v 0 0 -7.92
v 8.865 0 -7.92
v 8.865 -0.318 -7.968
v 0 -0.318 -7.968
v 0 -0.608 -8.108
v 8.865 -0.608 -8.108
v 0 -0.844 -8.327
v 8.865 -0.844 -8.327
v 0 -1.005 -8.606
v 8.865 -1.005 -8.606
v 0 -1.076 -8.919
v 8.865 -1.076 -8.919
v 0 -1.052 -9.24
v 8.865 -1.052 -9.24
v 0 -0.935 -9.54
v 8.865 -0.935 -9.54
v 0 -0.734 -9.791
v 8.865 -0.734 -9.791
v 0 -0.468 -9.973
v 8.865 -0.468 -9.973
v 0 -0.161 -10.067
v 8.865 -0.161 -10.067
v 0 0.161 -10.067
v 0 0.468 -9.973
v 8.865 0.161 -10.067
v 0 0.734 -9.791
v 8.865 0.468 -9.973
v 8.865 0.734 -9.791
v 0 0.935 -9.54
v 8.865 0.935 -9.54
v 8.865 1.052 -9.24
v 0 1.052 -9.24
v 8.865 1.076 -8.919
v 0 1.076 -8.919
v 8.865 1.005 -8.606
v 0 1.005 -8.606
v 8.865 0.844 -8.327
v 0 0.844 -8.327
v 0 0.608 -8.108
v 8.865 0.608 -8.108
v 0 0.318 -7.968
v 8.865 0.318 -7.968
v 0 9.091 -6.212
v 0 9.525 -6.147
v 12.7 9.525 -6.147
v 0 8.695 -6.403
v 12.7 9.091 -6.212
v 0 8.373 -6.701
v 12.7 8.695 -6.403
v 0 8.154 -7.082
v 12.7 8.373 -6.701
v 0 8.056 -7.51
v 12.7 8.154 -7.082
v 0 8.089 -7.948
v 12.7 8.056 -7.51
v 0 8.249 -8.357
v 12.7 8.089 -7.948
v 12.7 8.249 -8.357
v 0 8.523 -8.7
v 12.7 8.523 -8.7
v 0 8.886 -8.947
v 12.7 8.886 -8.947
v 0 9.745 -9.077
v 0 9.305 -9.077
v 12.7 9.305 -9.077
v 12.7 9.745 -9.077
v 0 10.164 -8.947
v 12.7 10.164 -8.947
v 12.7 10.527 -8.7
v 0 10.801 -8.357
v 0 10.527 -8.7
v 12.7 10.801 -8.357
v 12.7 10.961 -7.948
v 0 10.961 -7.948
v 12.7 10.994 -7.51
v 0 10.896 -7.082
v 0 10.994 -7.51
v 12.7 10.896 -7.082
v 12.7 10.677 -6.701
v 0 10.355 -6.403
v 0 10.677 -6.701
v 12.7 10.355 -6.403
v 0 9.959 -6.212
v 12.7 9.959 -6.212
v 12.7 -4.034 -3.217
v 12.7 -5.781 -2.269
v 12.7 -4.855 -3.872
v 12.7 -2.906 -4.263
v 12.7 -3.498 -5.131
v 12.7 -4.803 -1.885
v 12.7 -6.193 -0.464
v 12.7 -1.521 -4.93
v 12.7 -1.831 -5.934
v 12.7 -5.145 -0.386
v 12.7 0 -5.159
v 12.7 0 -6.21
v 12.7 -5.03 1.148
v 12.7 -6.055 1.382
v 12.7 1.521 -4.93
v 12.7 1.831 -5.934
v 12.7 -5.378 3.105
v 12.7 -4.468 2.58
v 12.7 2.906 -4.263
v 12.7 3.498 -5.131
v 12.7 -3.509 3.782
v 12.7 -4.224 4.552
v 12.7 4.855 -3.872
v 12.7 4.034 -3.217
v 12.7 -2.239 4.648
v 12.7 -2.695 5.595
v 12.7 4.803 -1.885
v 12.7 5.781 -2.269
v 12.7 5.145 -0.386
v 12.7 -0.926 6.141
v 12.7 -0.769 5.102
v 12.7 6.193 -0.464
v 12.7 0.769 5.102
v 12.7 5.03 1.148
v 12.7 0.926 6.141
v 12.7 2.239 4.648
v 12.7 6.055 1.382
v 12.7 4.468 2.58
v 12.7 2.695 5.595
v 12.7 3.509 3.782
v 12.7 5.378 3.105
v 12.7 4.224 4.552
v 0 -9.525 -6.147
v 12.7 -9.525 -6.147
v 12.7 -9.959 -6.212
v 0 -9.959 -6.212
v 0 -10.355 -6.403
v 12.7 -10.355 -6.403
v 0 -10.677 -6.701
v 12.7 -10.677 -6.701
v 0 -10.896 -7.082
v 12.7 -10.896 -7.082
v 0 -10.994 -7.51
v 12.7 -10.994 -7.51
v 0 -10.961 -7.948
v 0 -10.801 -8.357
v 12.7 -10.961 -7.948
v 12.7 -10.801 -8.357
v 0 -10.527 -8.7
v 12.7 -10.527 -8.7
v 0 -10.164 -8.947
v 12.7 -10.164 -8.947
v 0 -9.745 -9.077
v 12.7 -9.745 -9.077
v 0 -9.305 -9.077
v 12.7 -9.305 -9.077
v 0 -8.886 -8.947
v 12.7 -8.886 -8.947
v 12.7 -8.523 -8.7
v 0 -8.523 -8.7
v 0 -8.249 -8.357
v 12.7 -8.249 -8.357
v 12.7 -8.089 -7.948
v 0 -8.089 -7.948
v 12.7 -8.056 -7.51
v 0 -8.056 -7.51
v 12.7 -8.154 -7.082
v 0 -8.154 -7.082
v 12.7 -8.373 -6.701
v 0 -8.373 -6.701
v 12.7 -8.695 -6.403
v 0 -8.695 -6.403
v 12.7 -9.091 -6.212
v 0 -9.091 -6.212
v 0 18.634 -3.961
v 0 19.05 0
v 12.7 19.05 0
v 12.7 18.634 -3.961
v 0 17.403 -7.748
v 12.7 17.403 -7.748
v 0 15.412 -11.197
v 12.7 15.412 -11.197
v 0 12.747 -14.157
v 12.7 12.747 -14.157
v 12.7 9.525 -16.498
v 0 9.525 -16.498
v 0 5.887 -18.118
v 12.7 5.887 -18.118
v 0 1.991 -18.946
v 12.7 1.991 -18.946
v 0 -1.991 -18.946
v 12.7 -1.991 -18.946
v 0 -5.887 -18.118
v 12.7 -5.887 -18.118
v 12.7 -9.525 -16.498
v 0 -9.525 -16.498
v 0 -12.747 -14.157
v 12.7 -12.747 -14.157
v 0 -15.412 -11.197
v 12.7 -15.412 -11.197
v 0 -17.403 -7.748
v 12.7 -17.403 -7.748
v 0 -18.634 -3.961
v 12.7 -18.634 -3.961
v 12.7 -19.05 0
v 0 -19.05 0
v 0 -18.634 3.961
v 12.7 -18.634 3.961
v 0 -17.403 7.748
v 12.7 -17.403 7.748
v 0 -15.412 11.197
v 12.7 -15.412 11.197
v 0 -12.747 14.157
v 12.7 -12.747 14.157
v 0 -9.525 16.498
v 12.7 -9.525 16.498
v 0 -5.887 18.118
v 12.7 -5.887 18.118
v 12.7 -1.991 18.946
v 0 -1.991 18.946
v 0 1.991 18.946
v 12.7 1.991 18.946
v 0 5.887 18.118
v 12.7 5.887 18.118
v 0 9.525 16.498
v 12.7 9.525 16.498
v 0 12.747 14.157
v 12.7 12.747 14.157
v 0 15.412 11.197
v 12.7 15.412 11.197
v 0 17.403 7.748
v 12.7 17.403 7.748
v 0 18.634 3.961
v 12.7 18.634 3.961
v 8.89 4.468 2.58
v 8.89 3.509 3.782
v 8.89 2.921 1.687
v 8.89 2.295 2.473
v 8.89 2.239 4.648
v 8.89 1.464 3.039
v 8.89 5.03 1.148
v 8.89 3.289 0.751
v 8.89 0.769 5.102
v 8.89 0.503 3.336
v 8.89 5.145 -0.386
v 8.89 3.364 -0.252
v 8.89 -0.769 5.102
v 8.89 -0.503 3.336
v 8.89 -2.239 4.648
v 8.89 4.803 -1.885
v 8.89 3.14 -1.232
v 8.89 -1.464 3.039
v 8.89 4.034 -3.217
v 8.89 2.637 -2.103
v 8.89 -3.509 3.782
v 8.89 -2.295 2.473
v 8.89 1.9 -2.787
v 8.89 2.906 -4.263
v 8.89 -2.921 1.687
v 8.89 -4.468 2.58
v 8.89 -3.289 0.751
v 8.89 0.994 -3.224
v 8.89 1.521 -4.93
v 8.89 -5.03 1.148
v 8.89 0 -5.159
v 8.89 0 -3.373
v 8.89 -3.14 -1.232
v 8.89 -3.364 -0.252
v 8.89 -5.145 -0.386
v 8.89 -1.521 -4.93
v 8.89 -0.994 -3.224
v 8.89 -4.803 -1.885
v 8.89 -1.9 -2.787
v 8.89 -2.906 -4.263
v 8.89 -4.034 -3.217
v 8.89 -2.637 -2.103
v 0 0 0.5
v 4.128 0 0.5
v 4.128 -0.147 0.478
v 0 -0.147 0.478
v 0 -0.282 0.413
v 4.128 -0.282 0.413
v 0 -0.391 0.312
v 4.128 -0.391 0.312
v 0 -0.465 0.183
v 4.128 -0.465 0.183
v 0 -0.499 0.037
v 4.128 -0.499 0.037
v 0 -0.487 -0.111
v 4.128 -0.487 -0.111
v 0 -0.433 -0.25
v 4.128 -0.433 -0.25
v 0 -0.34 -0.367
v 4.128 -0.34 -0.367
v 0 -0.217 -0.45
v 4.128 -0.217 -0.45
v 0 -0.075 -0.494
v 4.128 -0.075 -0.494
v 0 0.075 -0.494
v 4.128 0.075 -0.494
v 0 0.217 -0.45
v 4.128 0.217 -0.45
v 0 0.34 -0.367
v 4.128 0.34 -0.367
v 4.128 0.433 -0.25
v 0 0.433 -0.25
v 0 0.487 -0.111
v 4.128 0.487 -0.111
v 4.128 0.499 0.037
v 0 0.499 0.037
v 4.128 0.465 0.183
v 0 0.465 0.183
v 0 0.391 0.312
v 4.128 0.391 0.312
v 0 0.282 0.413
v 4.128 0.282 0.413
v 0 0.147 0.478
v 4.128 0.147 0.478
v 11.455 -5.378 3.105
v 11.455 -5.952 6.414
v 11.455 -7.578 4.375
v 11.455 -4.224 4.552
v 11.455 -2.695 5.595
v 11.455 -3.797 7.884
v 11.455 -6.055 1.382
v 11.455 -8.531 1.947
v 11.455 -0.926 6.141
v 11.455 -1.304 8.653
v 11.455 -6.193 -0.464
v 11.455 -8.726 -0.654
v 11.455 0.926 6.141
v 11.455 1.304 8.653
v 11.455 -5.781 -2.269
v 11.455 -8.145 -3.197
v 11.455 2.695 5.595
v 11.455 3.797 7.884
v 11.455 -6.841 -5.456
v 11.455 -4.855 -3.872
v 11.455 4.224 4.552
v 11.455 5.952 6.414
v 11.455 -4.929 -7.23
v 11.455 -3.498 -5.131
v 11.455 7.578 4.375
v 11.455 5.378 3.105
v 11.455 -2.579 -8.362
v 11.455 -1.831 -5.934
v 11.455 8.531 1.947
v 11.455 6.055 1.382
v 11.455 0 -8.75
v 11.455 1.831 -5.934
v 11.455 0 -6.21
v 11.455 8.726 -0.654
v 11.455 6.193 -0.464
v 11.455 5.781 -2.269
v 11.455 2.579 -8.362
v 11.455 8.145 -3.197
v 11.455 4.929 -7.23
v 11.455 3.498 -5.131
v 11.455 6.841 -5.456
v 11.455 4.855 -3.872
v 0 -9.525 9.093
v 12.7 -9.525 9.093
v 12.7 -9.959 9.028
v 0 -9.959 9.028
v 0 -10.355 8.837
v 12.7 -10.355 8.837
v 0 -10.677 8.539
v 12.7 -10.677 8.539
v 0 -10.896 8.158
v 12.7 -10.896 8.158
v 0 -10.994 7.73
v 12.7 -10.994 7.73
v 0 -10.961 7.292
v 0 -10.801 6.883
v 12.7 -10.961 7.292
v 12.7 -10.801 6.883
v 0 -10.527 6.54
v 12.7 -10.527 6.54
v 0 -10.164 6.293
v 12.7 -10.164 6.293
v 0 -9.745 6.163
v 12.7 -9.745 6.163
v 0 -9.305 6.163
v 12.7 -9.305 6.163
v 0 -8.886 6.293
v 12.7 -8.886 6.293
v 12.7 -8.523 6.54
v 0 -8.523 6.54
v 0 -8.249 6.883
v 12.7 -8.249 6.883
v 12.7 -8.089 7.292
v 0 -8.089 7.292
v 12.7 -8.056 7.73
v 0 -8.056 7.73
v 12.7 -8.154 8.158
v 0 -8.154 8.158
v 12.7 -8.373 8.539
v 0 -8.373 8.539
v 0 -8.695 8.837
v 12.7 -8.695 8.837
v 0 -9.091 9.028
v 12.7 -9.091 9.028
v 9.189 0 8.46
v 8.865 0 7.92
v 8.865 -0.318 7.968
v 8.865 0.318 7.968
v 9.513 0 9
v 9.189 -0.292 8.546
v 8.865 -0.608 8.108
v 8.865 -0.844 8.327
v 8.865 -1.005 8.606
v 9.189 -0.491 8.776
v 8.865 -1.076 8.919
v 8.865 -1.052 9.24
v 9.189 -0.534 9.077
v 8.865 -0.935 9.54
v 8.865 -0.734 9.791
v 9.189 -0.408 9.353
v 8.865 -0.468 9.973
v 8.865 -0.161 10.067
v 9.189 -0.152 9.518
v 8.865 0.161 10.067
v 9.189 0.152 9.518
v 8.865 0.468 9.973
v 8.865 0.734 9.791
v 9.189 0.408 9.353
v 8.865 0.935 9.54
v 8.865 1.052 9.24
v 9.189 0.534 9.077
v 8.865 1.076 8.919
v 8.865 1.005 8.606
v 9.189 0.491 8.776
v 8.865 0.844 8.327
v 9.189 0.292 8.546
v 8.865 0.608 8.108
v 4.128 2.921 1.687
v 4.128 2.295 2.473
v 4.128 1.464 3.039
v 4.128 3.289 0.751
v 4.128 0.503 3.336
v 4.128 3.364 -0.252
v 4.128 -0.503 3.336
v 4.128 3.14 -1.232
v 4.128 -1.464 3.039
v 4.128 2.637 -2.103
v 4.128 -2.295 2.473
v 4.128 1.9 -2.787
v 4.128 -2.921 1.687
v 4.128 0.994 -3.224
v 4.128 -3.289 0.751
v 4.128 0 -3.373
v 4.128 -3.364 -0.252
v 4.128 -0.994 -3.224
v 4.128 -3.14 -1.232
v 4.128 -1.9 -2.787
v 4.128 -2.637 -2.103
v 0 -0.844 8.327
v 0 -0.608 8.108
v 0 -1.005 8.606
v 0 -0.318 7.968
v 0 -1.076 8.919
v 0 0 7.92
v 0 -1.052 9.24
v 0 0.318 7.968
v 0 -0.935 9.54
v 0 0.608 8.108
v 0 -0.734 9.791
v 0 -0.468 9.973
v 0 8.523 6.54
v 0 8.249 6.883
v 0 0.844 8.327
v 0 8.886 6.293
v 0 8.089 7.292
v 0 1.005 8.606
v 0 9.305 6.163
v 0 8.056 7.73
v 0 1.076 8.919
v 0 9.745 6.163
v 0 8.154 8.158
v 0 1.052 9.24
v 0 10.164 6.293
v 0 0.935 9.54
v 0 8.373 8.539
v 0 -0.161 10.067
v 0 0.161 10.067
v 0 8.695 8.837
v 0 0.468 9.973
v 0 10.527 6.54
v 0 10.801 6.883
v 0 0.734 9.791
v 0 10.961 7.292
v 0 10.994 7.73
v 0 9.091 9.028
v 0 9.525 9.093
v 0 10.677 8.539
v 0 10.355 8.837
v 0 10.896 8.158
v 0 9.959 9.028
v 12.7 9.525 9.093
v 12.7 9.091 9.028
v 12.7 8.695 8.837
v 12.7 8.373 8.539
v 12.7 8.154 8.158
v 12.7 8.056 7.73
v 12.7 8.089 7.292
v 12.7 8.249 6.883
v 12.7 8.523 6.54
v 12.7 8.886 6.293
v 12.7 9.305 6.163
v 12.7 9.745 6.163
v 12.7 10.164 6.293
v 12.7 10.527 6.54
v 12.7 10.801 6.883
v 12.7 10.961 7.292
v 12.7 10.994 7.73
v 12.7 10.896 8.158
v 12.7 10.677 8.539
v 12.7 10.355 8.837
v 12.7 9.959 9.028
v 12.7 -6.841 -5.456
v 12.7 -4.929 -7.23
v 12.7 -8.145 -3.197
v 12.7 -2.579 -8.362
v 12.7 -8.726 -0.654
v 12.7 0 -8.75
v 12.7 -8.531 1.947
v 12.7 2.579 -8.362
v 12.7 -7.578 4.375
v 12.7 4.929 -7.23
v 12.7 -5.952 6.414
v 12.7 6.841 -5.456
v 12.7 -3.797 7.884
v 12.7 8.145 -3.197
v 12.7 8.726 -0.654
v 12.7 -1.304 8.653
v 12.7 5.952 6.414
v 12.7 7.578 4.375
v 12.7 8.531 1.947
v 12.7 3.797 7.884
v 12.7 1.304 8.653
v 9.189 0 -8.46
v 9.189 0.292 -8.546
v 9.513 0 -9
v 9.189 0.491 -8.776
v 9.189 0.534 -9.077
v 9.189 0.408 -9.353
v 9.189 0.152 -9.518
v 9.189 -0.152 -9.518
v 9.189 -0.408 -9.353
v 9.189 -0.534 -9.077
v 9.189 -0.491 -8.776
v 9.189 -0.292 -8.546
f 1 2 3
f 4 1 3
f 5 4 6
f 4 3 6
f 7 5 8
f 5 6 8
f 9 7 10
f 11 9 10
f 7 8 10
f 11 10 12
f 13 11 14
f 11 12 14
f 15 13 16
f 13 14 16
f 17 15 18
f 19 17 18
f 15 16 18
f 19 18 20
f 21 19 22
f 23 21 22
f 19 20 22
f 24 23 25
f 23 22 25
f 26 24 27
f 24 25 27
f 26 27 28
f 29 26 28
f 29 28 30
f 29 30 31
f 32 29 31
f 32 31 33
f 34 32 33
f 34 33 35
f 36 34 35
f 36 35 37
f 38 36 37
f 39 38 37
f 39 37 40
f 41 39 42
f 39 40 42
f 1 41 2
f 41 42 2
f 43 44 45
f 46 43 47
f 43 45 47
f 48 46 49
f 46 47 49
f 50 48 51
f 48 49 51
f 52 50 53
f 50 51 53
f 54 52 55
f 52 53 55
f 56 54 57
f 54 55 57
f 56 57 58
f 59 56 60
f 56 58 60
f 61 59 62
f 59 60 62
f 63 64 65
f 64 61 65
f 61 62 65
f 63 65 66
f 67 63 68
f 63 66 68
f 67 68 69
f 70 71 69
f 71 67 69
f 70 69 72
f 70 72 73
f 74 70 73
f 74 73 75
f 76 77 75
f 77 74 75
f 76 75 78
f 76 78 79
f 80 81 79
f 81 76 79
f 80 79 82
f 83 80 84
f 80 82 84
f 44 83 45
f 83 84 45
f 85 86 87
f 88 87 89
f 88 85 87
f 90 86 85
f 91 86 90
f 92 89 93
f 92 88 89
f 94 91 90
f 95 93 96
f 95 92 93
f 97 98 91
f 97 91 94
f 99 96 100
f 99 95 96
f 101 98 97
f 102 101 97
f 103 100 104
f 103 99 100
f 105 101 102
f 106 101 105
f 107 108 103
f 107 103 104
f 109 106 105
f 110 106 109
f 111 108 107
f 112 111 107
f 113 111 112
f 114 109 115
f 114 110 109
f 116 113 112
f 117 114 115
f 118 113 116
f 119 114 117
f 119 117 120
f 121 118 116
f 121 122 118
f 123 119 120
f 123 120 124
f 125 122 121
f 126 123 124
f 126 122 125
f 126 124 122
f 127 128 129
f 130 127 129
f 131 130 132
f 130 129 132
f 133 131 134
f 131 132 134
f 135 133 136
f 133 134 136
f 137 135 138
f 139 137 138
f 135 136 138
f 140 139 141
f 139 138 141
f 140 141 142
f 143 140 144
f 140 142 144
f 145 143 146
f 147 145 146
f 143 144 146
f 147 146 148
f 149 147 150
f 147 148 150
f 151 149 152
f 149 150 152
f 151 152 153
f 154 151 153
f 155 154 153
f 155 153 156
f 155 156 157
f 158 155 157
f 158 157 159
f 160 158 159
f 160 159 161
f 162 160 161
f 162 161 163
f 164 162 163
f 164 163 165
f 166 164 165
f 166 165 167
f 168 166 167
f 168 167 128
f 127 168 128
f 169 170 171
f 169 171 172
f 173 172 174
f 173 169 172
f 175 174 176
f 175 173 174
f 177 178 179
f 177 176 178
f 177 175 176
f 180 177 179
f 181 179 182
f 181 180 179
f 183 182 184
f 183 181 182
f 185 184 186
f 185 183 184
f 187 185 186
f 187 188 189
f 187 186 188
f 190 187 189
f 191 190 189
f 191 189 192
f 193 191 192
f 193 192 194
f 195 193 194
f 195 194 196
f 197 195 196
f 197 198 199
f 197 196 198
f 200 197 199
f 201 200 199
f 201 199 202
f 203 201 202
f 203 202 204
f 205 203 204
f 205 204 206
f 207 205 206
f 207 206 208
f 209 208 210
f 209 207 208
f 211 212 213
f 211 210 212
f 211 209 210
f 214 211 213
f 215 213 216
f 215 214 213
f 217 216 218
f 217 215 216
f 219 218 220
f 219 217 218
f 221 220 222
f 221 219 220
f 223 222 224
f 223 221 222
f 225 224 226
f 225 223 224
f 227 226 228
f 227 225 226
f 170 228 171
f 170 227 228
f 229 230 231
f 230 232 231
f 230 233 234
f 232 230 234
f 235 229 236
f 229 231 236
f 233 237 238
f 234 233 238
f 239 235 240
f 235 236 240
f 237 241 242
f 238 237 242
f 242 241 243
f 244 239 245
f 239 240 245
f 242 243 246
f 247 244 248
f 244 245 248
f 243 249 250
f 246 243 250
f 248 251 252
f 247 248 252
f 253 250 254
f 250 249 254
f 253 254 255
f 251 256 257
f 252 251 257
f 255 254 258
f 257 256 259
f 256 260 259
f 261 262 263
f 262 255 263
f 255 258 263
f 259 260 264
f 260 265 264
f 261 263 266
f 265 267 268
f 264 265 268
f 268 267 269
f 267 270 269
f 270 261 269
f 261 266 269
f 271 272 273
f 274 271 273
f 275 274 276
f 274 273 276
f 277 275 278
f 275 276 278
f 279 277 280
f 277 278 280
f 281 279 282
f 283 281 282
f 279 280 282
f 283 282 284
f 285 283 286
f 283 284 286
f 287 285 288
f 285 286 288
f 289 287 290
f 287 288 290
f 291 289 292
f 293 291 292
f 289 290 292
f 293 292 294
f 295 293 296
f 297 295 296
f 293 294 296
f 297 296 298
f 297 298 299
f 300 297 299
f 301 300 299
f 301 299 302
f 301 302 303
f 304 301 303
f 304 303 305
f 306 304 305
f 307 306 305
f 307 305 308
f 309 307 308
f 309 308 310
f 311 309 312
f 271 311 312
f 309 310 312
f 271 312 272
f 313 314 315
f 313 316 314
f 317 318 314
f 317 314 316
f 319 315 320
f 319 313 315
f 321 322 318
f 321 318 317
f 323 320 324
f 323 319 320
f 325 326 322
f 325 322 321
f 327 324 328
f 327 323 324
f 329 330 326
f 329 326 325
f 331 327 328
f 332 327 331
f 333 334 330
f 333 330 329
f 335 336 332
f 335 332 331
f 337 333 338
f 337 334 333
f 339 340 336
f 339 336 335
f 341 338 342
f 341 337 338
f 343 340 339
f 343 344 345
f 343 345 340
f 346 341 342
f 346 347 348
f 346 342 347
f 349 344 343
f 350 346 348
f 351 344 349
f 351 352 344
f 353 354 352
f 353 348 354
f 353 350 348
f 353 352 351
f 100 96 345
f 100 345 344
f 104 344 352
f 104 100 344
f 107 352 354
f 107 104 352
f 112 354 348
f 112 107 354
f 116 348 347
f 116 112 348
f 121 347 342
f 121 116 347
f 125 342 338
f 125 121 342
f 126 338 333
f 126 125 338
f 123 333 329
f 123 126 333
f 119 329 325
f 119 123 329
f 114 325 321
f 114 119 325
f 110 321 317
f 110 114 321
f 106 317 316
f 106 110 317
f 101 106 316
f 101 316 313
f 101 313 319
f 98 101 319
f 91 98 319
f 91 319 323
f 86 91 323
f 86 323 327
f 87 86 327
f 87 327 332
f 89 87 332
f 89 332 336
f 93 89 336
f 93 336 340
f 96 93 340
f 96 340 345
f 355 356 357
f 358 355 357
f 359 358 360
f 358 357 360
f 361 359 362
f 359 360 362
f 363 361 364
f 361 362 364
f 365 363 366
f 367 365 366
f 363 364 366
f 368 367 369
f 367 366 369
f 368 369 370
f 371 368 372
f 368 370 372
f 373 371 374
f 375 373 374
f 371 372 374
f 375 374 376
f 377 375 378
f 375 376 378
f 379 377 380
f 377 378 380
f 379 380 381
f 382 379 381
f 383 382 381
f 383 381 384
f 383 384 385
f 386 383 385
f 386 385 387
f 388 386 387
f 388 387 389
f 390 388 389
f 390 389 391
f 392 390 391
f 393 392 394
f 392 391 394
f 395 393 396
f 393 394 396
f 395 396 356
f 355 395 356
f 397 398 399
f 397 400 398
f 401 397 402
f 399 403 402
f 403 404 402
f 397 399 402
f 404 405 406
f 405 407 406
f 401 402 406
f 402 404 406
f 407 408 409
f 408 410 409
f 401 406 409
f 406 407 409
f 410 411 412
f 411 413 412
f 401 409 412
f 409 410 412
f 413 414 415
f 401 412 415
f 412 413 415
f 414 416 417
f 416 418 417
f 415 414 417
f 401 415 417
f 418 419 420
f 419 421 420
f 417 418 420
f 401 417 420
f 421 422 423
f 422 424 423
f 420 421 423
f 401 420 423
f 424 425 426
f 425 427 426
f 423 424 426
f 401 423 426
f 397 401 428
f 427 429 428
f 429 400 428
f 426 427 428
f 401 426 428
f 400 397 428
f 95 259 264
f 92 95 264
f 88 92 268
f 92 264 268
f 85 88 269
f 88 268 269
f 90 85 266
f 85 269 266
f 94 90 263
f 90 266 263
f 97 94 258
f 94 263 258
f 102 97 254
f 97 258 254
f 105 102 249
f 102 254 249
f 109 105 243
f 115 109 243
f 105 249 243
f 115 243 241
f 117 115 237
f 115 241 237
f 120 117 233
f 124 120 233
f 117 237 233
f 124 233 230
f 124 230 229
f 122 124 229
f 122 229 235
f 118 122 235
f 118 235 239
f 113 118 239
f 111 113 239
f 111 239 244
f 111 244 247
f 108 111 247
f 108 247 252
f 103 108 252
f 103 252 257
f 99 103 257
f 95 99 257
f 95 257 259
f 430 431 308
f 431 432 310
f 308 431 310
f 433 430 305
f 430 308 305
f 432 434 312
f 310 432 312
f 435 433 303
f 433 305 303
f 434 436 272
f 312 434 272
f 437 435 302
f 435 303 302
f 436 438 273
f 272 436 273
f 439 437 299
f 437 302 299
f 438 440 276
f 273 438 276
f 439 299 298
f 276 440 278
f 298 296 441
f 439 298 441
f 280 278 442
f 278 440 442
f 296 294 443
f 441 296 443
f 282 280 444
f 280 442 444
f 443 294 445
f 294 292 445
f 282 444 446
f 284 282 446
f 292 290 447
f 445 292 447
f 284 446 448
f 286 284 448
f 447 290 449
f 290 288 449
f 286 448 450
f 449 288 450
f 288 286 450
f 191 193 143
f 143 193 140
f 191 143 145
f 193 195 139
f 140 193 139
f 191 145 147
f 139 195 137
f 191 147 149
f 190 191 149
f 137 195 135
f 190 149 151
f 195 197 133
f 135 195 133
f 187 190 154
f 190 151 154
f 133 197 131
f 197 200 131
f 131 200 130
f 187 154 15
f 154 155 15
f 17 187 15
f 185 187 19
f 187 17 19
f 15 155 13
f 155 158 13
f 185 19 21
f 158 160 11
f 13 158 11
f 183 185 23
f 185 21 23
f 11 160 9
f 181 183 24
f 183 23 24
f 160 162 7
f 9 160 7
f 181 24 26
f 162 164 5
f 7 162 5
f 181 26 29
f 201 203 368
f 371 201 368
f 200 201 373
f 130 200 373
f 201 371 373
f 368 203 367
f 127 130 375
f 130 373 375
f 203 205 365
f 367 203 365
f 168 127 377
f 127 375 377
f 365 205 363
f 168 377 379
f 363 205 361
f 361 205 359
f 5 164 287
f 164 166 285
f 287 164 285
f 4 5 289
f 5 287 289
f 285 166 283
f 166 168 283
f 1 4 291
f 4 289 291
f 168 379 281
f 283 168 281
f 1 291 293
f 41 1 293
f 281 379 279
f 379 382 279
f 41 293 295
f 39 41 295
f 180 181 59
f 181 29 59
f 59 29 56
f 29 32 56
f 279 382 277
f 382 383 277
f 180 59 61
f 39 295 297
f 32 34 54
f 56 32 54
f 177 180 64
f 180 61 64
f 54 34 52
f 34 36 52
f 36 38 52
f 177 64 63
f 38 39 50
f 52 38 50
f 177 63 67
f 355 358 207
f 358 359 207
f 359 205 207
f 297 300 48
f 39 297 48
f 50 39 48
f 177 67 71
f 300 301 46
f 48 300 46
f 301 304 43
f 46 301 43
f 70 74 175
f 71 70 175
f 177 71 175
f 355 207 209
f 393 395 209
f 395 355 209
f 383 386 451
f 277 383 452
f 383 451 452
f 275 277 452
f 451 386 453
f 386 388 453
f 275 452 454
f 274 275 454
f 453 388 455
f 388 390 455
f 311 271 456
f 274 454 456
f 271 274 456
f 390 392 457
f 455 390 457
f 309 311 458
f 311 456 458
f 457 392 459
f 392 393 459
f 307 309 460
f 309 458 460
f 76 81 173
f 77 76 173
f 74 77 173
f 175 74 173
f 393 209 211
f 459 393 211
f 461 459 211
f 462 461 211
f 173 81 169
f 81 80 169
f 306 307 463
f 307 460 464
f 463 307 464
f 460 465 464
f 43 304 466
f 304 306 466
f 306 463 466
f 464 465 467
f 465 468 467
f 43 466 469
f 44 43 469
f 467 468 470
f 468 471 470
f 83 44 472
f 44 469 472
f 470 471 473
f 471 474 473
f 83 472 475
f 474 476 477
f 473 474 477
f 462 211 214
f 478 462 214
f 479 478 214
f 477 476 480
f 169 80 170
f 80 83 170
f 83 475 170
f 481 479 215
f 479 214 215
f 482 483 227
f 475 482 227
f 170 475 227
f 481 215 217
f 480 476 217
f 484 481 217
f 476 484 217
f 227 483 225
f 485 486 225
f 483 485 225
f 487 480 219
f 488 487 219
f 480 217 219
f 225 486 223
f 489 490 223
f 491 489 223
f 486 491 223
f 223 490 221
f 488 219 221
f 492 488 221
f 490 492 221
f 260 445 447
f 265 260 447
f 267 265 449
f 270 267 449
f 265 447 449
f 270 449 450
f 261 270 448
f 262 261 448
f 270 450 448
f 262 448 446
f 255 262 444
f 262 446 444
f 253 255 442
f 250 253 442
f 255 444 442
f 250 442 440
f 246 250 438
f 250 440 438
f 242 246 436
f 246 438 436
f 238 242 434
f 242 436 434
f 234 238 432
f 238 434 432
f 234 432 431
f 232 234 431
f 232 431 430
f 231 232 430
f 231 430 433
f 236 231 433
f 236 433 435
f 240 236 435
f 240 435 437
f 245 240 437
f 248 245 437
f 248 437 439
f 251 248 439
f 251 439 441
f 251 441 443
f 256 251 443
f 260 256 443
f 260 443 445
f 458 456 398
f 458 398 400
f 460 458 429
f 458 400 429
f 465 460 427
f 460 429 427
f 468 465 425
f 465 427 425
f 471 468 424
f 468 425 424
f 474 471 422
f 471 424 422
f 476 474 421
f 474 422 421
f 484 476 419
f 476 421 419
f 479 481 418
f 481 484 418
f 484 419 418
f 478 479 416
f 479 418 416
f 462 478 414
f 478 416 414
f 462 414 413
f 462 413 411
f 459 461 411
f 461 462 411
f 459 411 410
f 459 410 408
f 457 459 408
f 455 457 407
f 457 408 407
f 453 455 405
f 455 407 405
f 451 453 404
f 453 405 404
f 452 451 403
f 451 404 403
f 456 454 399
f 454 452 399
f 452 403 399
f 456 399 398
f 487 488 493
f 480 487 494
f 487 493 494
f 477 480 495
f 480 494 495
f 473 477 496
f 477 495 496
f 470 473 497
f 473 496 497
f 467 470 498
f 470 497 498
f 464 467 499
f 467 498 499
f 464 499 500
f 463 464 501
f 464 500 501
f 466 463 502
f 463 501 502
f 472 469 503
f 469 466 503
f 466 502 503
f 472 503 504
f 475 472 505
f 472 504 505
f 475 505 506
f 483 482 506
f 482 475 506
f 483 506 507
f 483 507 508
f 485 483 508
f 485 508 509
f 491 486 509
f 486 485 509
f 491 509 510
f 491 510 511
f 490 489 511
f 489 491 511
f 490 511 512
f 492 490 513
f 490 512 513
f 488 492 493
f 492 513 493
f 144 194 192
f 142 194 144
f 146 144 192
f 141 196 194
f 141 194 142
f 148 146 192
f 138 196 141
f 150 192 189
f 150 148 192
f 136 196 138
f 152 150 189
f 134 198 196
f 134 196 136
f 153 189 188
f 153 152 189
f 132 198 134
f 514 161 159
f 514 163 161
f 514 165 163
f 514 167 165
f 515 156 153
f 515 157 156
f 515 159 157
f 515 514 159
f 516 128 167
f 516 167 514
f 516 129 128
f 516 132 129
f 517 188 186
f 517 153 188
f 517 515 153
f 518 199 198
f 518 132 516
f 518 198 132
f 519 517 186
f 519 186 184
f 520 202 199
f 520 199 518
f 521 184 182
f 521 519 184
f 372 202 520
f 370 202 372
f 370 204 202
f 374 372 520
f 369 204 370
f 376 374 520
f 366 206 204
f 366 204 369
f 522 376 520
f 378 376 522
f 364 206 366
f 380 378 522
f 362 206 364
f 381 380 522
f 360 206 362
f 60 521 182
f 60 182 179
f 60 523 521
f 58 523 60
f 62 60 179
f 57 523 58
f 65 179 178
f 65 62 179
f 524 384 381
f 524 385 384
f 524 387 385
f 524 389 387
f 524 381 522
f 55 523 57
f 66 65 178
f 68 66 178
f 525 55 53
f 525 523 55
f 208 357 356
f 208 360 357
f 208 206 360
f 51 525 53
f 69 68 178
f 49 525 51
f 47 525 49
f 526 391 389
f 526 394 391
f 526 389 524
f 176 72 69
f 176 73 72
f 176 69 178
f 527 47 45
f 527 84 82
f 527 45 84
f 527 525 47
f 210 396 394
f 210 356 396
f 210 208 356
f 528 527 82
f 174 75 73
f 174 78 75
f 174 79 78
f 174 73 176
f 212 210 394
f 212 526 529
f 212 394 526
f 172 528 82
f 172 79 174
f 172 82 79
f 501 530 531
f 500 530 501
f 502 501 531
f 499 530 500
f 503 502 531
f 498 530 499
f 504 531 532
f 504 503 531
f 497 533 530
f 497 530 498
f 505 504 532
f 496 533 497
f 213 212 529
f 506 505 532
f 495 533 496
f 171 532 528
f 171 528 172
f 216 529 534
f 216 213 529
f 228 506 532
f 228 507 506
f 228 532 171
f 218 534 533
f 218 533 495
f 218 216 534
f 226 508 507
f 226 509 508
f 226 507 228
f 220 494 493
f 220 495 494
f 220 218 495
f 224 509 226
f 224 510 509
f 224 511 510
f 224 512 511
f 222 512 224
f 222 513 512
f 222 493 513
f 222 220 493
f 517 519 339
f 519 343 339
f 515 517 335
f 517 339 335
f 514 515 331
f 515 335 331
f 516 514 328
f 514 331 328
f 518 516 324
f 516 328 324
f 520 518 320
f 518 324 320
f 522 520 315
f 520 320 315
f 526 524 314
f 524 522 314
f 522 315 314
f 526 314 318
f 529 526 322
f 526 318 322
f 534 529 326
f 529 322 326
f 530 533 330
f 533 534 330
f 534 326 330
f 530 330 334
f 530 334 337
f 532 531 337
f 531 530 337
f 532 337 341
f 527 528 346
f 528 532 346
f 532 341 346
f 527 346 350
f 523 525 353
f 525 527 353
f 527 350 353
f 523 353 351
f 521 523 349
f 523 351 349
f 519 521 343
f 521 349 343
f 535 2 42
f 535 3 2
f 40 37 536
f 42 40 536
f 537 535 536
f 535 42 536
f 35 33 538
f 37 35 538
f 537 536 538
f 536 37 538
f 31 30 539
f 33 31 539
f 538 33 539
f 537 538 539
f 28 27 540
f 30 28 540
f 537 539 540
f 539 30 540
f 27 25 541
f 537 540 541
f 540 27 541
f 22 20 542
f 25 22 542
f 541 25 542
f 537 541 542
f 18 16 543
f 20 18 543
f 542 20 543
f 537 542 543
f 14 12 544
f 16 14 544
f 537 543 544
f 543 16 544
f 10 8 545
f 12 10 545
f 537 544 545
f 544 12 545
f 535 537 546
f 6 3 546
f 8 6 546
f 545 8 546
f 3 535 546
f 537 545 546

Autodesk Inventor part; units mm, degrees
ref_plane "YZ Plane" through (0, 0, 0) normal (1, 0, 0) x (0, 1, 0)
sketch "Sketch1" plane through (0, 0, 0) normal (1, 0, 0) x (0, 1, 0)
  circle A0 centre (0, 0) radius 19.05
  dimension "d0" = 38.1
extrude "Extrusion1" add sketch "Sketch1" along normal blind 12.7
sketch "Sketch10" plane through (12.7, 0, 0) normal (1, 0, 0) x (0, 0, -1)
  point P0 (0, 0)
  point P1 (0, 0)
hole "Hole4" at (12.7, 0, 0) direction (-1, 0, 0) diameter 10.3188 depth 3.81
ref_plane "Work Plane2" through (8.89, 0, 0) normal (1, 0, 0) x (0, 0, -1)
hole "Hole1" at (8.89, 0, 0) direction (-1, 0, 0) diameter 6.7469 depth 4.7625
ref_plane "Work Plane1" through (-12.7, 0, 0) normal (1, 0, 0) x (0, 0, -1)
sketch "Sketch5" plane through (0, 0, 0) normal (1, 0, 0) x (0, 1, 0)
  line L0 (0, 9) -> (0, -9)
  circle A0 centre (0, 0) radius 19.05 projected
  line L1 (-9.525, 0) -> (9.525, 0)
  line L2 (-9.525, 7.62) -> (-9.525, -7.62)
  dimension "d37" = 18
  dimension "d45" = 19.05
  dimension "d46" = 15.24
hole "Hole2" at (0, 0, -9) direction (1, 0, 0) diameter 2.159 depth 8.8646 tip angle 118
sketch "Sketch6" plane through (0, 0, 0) normal (-1, 0, 0) x (0, 0, 1)
  circle A0 centre (0, 0) radius 0.5715
  dimension "d34" = 1.143
hole "Hole5" at (0, 0, 0) direction (1, 0, 0) diameter 1 end through all
mirror "Mirror1" about plane through (0, 0, 0) normal (0, 0, 1) of "Hole2"
hole "Hole3" at (0, -9.525, 7.62) at (0, -9.525, -7.62) direction (1, 0, 0) diameter 2.9464 end through all clearance for "Flat Head Machine Screw (82)" size "#4" standard "Ansi Unified Screw Threads"
mirror "Mirror2" about plane through (0, 0, 0) normal (0, 1, 0) of "Hole3"
sketch "Sketch9" plane through (0, 0, 0) normal (0, 1, 0) x (-1, 0, 0)
  line L0 (-11.4554, -6.2103) -> (-12.7, -6.2103)
  line L1 (-12.7, -6.2103) -> (-12.7, -8.7503)
  line L2 (-12.7, -8.7503) -> (-11.4554, -8.7503)
  line L3 (-11.4554, -8.7503) -> (-11.4554, -6.2103)
  line L4 (2.54, 0) -> (-15.24, 0) projected
  line L5 (-12.7, 19.05) -> (-12.7, -19.05) projected
  point P0 (0, 0)
  dimension "d55" = 2.54
  dimension "d56" = 1.2446
  dimension "d59" = 6.2103
revolve "Revolution1" cut sketch "Sketch9" angle 360 about axis through (-10, 0, 0) along (1, 0, 0)
properties part number "NuMu sensor" material "Aluminum 6061"
